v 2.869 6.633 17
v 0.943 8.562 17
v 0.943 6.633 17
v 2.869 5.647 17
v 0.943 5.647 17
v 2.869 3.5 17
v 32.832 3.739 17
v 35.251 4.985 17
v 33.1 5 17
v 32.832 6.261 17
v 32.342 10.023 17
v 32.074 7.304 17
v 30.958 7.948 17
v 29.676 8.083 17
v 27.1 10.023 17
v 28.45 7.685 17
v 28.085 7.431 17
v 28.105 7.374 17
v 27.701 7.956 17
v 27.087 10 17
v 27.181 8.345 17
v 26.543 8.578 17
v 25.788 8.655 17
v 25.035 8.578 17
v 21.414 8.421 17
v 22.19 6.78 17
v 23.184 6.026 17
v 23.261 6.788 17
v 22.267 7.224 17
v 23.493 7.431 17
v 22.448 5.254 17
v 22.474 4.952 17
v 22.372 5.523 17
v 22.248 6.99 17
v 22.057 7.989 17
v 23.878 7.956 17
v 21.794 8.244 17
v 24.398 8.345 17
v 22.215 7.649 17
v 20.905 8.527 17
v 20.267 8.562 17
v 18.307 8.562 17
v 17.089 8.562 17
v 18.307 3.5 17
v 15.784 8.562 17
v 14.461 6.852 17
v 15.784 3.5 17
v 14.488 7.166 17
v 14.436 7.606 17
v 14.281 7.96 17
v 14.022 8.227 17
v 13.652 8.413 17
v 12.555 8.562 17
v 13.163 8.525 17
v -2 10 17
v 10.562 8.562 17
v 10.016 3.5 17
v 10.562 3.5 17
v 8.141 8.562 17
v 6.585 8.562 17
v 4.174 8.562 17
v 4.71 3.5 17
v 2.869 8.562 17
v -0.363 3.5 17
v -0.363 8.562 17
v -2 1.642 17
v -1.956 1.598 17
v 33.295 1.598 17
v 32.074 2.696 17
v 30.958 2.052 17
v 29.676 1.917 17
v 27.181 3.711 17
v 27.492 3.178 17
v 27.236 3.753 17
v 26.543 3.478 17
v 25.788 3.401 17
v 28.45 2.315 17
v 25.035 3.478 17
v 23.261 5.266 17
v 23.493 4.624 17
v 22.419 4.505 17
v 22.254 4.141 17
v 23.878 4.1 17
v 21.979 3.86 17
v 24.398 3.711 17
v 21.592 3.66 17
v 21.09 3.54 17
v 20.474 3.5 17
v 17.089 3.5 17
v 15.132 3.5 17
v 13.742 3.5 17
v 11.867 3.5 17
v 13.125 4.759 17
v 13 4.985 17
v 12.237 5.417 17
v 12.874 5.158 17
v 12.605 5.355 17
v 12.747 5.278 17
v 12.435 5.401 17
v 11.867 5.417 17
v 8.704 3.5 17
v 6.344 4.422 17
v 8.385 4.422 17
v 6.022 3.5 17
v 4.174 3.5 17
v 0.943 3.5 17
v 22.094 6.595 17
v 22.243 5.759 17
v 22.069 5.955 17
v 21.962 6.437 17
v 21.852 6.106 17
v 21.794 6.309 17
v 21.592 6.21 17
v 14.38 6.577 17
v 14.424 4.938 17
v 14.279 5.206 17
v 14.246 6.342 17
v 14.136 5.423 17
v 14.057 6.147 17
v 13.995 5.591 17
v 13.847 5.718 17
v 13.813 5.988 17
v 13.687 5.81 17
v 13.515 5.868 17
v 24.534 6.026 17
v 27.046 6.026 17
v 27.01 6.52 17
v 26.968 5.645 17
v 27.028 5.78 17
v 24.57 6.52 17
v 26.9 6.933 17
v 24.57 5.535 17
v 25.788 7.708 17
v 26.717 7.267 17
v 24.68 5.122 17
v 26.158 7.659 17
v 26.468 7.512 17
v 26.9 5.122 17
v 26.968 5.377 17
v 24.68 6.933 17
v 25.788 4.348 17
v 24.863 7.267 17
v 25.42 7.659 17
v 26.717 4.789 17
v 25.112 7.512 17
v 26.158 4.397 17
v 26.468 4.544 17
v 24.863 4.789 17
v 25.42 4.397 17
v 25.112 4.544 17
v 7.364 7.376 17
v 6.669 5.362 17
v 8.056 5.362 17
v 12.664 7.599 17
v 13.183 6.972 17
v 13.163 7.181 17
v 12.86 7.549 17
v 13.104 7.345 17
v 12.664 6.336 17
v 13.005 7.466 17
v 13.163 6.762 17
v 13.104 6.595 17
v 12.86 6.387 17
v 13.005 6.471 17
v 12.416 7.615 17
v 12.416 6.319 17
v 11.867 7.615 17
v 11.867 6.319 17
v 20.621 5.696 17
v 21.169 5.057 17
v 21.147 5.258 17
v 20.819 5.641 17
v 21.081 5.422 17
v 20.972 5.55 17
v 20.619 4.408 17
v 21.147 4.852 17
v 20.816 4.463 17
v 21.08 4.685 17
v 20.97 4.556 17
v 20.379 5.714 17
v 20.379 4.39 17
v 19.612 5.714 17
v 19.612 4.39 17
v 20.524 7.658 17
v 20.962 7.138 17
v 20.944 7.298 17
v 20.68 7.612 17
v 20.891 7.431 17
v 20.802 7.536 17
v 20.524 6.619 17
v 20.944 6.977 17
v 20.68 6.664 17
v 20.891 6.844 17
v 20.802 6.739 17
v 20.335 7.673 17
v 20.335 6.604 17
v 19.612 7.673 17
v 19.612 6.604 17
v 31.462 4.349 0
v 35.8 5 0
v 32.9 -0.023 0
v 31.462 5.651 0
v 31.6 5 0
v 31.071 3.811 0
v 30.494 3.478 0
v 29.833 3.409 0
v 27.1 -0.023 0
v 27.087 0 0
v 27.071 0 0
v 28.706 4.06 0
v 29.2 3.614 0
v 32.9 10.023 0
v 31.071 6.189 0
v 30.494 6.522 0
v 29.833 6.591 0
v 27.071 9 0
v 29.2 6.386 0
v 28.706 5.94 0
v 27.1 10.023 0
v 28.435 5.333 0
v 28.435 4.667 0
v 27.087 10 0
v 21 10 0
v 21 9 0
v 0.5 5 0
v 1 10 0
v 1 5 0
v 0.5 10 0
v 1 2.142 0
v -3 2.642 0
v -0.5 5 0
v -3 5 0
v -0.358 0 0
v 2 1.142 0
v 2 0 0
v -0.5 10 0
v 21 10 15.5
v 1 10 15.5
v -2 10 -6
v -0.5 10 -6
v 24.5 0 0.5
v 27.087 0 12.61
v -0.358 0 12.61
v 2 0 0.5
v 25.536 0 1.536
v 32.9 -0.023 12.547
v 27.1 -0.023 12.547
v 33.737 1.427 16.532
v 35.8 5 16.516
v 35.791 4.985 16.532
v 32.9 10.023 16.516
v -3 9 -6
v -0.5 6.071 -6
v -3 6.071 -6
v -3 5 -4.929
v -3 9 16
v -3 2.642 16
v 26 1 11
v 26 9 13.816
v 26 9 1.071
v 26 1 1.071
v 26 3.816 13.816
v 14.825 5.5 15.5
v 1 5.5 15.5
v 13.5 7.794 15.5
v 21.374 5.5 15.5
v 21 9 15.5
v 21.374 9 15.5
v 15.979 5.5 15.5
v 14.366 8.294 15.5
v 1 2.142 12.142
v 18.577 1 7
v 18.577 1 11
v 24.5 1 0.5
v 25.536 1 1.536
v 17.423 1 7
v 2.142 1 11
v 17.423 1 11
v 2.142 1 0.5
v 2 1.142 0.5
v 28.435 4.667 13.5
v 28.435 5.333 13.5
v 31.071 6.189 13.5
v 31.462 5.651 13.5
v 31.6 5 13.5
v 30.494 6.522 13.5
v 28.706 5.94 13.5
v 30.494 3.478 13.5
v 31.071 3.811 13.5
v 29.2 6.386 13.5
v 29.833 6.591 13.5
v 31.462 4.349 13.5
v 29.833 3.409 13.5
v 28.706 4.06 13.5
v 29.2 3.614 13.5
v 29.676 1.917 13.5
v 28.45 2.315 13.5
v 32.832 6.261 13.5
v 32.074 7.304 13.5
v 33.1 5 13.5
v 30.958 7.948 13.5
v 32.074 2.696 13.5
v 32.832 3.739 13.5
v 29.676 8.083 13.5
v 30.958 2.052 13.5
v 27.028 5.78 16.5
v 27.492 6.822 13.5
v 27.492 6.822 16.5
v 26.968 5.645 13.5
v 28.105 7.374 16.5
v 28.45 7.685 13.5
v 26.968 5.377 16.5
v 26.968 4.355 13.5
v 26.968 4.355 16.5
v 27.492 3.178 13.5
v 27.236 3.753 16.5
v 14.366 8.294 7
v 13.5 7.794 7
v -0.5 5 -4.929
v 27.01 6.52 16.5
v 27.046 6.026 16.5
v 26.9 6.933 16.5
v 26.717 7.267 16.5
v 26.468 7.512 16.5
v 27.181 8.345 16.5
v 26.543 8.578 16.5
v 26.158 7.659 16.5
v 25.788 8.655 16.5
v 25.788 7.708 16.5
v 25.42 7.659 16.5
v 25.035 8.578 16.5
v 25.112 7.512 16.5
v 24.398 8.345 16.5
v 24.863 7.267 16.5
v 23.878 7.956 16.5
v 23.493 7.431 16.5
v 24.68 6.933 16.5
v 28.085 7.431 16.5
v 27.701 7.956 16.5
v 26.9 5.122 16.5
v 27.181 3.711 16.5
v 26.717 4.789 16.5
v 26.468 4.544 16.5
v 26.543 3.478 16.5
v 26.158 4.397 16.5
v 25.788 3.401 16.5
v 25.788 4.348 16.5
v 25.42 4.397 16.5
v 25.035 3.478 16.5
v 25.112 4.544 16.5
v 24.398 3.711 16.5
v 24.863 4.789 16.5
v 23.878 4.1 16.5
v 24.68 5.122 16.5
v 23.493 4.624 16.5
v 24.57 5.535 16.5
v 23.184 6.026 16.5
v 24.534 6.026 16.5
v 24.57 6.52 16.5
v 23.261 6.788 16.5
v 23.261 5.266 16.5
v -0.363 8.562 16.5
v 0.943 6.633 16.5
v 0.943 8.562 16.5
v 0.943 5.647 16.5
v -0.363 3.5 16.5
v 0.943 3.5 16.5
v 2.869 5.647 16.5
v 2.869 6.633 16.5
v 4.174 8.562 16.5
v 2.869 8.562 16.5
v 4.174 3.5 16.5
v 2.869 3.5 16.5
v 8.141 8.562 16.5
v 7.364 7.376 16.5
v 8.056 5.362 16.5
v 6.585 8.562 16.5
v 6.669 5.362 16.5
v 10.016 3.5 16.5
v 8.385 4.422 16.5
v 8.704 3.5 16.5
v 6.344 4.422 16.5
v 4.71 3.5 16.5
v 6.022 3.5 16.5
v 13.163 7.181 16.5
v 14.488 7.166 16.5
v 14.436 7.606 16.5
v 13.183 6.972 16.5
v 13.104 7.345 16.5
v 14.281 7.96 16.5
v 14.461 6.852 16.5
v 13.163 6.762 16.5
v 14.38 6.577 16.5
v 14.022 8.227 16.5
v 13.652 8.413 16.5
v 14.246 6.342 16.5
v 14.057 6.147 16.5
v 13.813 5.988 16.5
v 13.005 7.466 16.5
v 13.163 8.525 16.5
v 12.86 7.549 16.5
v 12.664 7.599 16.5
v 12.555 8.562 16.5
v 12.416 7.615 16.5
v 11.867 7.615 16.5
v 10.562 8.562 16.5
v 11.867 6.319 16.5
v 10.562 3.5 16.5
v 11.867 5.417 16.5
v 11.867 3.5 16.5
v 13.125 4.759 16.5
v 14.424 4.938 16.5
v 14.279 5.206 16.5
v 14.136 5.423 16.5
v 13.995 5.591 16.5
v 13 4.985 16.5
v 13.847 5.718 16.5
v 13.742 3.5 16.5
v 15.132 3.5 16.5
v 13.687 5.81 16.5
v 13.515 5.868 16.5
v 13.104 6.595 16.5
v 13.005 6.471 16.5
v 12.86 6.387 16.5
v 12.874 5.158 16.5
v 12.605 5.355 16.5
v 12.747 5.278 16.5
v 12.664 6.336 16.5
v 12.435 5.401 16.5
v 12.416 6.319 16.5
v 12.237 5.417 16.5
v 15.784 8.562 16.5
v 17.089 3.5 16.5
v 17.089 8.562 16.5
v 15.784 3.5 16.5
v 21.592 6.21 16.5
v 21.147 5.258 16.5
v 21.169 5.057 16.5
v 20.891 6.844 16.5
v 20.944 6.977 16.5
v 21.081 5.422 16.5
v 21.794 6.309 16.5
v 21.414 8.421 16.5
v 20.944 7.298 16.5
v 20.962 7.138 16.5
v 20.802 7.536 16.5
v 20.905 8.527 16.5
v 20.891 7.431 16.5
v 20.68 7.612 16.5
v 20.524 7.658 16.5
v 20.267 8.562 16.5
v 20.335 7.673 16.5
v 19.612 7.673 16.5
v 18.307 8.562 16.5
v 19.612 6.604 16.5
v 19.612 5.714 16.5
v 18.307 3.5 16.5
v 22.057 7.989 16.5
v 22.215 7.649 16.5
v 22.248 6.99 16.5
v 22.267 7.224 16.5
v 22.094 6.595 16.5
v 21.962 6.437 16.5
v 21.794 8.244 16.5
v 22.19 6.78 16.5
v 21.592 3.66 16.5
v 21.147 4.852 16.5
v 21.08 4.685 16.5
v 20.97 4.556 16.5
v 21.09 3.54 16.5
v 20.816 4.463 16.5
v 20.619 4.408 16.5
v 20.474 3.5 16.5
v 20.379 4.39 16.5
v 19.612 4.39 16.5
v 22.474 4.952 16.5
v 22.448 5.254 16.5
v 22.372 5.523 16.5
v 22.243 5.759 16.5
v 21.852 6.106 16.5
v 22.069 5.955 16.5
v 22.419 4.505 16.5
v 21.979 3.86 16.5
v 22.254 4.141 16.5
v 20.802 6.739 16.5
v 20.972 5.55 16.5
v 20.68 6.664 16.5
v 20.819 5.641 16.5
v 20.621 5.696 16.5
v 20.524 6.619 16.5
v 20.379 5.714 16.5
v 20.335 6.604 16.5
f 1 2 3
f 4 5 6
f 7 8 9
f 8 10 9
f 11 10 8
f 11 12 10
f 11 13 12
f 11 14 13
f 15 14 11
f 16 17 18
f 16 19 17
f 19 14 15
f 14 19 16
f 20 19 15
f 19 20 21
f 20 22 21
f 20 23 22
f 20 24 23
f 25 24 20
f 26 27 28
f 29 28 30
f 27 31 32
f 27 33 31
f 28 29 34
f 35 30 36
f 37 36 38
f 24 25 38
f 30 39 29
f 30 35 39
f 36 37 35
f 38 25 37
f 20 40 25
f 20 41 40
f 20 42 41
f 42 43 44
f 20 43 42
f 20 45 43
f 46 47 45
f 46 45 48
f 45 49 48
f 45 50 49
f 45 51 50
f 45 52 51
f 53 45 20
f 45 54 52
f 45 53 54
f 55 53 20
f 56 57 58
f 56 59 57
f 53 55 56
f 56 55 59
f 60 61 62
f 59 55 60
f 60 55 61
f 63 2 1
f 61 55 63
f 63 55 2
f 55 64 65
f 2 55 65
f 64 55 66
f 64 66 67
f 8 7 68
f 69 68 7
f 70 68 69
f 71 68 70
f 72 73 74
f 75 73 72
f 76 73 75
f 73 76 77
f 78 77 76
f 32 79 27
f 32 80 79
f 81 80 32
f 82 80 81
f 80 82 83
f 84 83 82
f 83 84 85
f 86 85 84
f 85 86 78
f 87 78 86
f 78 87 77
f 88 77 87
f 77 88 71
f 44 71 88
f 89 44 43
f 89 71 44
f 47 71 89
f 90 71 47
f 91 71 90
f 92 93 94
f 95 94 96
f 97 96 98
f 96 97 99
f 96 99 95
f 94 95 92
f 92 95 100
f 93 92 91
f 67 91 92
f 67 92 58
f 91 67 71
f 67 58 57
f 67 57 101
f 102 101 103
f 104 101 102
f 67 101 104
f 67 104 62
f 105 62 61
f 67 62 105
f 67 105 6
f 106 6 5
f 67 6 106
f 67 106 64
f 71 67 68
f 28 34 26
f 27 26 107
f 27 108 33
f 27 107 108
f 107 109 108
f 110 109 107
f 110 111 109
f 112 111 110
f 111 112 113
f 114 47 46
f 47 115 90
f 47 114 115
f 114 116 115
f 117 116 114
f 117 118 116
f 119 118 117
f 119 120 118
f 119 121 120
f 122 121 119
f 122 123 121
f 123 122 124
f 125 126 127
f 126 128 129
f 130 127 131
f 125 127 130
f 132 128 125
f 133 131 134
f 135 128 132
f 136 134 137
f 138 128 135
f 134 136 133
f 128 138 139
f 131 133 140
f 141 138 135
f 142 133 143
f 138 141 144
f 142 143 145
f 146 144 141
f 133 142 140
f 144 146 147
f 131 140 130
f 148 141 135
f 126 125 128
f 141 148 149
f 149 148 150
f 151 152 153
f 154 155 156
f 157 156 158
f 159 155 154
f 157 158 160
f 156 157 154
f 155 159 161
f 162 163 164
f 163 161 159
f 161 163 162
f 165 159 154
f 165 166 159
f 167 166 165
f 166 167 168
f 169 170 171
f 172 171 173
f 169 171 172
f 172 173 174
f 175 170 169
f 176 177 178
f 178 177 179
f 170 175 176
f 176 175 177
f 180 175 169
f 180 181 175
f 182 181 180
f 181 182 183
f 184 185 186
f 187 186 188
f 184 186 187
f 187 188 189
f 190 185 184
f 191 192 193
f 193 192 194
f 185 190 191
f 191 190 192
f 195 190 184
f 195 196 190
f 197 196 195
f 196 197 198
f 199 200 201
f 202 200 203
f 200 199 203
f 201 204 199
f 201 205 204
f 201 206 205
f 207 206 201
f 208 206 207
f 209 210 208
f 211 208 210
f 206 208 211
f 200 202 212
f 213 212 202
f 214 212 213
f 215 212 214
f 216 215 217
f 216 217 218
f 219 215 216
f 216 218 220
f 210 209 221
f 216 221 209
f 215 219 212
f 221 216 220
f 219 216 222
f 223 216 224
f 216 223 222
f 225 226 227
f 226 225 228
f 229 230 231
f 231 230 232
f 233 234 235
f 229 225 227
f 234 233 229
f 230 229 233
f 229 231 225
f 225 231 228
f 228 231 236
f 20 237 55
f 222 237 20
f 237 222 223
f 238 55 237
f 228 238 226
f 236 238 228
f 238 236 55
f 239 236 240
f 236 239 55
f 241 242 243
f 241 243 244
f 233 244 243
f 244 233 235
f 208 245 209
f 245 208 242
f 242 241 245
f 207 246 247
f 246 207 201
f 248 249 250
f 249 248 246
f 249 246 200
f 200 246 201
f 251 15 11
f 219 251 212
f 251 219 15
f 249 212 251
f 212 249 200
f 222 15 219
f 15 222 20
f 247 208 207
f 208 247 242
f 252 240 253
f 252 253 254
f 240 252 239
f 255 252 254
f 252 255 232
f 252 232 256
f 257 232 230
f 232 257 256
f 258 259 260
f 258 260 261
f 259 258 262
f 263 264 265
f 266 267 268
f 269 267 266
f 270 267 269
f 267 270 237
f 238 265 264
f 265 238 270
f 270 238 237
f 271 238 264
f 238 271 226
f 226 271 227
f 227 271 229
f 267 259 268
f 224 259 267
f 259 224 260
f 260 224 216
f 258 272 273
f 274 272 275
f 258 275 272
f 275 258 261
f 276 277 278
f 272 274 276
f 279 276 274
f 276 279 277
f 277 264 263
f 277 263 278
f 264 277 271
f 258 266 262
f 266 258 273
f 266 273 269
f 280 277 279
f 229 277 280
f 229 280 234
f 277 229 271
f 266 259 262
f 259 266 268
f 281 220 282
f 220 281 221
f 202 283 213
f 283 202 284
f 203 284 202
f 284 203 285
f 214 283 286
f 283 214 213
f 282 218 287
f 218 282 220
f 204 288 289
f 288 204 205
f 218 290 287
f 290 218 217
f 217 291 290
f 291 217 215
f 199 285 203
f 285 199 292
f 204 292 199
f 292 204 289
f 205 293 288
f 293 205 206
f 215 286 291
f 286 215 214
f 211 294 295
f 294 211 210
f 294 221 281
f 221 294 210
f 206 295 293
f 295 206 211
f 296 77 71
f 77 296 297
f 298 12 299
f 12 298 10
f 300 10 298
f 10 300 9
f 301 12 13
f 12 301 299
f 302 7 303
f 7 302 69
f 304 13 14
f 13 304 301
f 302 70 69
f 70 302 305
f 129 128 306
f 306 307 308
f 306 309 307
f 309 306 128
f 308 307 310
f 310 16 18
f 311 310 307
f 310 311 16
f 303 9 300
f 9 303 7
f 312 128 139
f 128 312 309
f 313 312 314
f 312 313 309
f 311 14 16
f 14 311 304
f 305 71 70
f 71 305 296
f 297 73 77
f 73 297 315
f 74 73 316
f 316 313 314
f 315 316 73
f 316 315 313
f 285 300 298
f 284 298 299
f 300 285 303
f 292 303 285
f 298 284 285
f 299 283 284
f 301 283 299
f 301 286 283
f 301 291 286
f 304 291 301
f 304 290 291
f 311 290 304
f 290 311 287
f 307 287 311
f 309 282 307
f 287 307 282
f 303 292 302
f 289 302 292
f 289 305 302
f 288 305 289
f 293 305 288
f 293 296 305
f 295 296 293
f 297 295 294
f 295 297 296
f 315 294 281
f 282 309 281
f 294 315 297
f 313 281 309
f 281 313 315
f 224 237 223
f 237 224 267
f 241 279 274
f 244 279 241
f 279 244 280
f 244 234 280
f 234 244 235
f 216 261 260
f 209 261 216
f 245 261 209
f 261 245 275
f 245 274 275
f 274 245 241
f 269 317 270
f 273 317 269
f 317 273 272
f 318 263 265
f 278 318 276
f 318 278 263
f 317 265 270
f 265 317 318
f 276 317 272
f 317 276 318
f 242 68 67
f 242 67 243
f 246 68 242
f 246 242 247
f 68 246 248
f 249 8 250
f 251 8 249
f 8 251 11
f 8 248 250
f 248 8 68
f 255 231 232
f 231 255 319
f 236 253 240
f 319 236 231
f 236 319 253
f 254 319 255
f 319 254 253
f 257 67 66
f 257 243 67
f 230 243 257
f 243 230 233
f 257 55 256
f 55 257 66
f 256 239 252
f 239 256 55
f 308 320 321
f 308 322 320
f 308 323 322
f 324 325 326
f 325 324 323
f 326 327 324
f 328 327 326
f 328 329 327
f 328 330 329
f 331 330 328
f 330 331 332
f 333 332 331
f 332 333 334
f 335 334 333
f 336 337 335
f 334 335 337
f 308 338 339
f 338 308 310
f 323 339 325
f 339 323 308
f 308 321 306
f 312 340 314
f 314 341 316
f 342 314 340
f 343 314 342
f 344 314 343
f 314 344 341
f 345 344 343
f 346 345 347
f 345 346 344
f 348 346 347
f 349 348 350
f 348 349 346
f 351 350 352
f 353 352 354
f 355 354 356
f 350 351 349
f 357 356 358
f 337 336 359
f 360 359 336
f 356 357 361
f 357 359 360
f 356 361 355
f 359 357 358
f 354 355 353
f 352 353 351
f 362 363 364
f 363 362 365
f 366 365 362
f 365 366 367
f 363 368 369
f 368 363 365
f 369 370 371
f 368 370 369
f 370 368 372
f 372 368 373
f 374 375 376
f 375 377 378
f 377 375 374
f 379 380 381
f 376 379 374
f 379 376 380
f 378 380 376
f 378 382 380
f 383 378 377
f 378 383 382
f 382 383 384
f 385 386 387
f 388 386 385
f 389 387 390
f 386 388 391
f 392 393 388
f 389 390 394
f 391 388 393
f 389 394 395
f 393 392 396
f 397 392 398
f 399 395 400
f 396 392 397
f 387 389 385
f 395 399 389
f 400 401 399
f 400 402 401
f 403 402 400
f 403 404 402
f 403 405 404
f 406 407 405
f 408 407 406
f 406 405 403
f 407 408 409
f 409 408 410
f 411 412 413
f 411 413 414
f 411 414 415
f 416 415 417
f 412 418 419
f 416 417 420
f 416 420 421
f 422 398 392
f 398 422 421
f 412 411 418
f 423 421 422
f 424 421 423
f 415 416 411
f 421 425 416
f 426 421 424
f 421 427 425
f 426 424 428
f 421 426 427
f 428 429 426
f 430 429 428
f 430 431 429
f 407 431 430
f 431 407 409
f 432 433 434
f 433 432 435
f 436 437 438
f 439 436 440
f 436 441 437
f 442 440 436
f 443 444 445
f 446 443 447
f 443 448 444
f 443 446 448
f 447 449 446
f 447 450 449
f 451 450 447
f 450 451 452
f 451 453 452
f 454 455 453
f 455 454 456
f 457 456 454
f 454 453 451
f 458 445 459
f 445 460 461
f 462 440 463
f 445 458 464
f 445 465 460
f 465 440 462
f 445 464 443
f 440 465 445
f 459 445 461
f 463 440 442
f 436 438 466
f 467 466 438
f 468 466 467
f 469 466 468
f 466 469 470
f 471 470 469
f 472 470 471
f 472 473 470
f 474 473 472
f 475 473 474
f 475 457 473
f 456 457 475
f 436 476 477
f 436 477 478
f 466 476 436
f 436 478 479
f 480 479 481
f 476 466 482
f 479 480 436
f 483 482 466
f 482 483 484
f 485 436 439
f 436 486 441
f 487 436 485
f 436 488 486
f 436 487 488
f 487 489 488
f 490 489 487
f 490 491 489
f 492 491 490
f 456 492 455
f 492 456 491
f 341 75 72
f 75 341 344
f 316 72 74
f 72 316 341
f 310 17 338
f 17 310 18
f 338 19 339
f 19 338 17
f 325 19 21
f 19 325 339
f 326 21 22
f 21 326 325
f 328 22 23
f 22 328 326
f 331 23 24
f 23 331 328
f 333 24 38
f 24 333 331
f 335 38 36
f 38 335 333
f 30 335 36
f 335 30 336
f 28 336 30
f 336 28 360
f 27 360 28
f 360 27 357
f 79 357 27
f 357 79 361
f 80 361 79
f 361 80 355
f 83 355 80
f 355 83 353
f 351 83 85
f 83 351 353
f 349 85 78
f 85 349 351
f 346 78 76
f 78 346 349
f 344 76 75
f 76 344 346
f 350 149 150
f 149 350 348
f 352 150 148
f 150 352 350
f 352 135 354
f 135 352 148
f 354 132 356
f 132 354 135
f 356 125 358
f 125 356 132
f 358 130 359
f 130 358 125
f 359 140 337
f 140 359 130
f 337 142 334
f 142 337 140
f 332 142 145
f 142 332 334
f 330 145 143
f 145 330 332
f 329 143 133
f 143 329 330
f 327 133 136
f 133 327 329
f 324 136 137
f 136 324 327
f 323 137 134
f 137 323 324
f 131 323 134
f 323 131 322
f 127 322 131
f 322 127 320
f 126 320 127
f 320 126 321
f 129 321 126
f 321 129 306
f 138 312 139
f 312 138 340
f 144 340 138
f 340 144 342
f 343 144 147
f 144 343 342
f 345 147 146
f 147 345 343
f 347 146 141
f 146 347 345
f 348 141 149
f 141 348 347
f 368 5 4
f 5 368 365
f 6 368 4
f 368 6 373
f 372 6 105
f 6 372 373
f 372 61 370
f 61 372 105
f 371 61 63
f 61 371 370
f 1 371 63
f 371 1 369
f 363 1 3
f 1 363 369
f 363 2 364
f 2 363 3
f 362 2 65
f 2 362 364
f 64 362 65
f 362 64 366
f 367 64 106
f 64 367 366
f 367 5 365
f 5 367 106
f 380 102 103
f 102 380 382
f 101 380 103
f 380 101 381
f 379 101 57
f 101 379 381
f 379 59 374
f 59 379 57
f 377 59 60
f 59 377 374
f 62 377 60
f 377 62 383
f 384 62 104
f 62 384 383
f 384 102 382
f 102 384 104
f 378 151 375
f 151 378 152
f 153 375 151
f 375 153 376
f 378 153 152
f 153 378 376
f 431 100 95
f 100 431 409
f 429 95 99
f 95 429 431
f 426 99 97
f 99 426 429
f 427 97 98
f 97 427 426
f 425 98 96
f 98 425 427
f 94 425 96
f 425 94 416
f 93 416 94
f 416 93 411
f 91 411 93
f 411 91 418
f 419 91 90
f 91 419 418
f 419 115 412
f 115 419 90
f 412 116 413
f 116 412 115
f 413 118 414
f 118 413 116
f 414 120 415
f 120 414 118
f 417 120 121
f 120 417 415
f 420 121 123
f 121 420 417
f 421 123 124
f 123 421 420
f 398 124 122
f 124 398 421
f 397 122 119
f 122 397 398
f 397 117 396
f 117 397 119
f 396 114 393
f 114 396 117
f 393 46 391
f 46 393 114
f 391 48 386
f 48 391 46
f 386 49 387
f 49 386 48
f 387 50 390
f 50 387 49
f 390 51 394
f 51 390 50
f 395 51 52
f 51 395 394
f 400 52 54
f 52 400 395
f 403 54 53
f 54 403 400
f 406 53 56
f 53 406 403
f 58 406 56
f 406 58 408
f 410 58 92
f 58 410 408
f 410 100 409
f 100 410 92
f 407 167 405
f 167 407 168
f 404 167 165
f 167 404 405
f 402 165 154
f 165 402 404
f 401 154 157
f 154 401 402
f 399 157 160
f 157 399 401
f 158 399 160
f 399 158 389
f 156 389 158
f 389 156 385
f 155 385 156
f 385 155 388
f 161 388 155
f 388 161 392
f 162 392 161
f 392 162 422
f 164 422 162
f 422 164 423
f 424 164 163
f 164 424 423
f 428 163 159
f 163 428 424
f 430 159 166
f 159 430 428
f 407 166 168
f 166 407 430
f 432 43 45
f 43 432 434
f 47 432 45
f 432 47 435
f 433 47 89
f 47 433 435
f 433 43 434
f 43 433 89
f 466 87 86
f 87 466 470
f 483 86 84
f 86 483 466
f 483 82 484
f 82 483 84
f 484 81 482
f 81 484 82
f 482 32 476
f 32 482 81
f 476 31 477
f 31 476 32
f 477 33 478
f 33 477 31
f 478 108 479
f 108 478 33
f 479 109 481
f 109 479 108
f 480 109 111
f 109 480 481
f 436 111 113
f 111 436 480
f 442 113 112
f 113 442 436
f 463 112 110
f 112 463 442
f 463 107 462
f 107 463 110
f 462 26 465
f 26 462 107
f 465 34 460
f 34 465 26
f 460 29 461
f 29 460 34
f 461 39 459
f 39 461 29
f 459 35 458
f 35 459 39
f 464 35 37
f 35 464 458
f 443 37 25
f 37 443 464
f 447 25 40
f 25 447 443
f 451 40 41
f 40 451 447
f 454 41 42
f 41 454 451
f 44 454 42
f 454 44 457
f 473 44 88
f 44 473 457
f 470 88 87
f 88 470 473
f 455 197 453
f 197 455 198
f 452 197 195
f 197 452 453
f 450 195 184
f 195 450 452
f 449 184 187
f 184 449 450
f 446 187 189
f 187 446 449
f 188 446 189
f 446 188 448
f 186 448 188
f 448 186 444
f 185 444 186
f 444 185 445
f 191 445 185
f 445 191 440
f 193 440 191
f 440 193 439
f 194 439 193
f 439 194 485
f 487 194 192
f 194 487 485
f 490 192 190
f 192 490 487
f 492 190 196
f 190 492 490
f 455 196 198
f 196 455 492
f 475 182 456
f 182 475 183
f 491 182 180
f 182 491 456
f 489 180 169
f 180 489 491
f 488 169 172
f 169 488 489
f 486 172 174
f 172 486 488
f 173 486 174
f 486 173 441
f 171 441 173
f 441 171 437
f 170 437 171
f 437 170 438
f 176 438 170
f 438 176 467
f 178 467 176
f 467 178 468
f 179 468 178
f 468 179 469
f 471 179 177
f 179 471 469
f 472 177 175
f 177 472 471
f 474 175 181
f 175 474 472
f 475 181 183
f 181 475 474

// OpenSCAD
module fan_nozzle(){
    
difference(){    
union(){
cube([32,10,17]); // Main cube
translate([30,5,0])cylinder(r=5.8,h = 17, $fn=6);    
translate([-3,0,-6]) cube([3,10,23]);
//#translate([-2,5,0])cylinder(r=5.8,h = 17, $fn=6);        
}
// Mounting screw
translate([30,5,-10])cylinder(r=3.2/2,h = 24.5-0.2, $fn=15); // Screw cut
translate([30,5,17-3.5])cylinder(r=3.1,h = 20, $fn=15); // head cut

//#translate([-2,5,-10])cylinder(r=3.2/2,h = 24.5-0.2, $fn=15); // Screw cut
//#translate([-2,5,17-3.5])cylinder(r=3.1,h = 20, $fn=15); // head cut

// Fan entry hole
translate([1,10-1.5,-1])cube([20,3,16.5]);
translate([1,10-1.5,-1-5])cube([18,3,16.5]);
    
// Airway cutout
difference(){    
translate([1,1,-1])cube([25,8,16.5]);    
translate([0,0,10])rotate([45,0,0])cube([30,8,16.5]);    
translate([-1,-10,-1])rotate([0,0,45])cube([10,8,30]); 
translate([20,0,16])rotate([0,20,0])cube([10,20,10]);    
}
translate([2,-1,-4.5])cube([24,3,5]);
//#translate([-2,-1,-2])rotate([0,45,0])cube([5,10,5]);
translate([22,-1,-2])rotate([0,45,0])cube([5,10,5]);
    
}

// Air director
translate([18,0,7])rotate([0,0,30])cube([1,9,10]);


}

module fancy_corners(){
    
    translate([-10,-10.5,13])rotate([-20,0,0])cube([50,10,15]);
    translate([-16,-10.5,17.5])rotate([0,45,0])cube([10,30,15]);
    
    translate([46.5,-10.5,15])rotate([0,-45,30])cube([10,30,15]);
    translate([28.62,-10.5,15])rotate([0,-45,-30])cube([10,30,15]);

    translate([-5,-1,-7])rotate([0,0,0]) cube([10,6,7]);
    translate([-0.5,-1,-7])rotate([0,0,0]) cube([1,15,7]);
    translate([-5,4,-11])rotate([45,0,0]) cube([10,5,5]);

    //left cut
    translate([-6.5,-8,-5])rotate([0,0,45])cube([10,10,45]);
    translate([-7,-5,12])rotate([0,-45,0])cube([10,30,15]);
    
    translate([-7,5,-10])rotate([0,0,45])cube([10,10,35]);
    
    }

module fan_n(){
difference(){
fan_nozzle();
fancy_corners();    
translate([-1,3.5,16.5])linear_extrude(height = 0.6) {text("HARIBO", size = 5, font = "Helvetica Neue:style=Bold");}
}
}
fan_n();
